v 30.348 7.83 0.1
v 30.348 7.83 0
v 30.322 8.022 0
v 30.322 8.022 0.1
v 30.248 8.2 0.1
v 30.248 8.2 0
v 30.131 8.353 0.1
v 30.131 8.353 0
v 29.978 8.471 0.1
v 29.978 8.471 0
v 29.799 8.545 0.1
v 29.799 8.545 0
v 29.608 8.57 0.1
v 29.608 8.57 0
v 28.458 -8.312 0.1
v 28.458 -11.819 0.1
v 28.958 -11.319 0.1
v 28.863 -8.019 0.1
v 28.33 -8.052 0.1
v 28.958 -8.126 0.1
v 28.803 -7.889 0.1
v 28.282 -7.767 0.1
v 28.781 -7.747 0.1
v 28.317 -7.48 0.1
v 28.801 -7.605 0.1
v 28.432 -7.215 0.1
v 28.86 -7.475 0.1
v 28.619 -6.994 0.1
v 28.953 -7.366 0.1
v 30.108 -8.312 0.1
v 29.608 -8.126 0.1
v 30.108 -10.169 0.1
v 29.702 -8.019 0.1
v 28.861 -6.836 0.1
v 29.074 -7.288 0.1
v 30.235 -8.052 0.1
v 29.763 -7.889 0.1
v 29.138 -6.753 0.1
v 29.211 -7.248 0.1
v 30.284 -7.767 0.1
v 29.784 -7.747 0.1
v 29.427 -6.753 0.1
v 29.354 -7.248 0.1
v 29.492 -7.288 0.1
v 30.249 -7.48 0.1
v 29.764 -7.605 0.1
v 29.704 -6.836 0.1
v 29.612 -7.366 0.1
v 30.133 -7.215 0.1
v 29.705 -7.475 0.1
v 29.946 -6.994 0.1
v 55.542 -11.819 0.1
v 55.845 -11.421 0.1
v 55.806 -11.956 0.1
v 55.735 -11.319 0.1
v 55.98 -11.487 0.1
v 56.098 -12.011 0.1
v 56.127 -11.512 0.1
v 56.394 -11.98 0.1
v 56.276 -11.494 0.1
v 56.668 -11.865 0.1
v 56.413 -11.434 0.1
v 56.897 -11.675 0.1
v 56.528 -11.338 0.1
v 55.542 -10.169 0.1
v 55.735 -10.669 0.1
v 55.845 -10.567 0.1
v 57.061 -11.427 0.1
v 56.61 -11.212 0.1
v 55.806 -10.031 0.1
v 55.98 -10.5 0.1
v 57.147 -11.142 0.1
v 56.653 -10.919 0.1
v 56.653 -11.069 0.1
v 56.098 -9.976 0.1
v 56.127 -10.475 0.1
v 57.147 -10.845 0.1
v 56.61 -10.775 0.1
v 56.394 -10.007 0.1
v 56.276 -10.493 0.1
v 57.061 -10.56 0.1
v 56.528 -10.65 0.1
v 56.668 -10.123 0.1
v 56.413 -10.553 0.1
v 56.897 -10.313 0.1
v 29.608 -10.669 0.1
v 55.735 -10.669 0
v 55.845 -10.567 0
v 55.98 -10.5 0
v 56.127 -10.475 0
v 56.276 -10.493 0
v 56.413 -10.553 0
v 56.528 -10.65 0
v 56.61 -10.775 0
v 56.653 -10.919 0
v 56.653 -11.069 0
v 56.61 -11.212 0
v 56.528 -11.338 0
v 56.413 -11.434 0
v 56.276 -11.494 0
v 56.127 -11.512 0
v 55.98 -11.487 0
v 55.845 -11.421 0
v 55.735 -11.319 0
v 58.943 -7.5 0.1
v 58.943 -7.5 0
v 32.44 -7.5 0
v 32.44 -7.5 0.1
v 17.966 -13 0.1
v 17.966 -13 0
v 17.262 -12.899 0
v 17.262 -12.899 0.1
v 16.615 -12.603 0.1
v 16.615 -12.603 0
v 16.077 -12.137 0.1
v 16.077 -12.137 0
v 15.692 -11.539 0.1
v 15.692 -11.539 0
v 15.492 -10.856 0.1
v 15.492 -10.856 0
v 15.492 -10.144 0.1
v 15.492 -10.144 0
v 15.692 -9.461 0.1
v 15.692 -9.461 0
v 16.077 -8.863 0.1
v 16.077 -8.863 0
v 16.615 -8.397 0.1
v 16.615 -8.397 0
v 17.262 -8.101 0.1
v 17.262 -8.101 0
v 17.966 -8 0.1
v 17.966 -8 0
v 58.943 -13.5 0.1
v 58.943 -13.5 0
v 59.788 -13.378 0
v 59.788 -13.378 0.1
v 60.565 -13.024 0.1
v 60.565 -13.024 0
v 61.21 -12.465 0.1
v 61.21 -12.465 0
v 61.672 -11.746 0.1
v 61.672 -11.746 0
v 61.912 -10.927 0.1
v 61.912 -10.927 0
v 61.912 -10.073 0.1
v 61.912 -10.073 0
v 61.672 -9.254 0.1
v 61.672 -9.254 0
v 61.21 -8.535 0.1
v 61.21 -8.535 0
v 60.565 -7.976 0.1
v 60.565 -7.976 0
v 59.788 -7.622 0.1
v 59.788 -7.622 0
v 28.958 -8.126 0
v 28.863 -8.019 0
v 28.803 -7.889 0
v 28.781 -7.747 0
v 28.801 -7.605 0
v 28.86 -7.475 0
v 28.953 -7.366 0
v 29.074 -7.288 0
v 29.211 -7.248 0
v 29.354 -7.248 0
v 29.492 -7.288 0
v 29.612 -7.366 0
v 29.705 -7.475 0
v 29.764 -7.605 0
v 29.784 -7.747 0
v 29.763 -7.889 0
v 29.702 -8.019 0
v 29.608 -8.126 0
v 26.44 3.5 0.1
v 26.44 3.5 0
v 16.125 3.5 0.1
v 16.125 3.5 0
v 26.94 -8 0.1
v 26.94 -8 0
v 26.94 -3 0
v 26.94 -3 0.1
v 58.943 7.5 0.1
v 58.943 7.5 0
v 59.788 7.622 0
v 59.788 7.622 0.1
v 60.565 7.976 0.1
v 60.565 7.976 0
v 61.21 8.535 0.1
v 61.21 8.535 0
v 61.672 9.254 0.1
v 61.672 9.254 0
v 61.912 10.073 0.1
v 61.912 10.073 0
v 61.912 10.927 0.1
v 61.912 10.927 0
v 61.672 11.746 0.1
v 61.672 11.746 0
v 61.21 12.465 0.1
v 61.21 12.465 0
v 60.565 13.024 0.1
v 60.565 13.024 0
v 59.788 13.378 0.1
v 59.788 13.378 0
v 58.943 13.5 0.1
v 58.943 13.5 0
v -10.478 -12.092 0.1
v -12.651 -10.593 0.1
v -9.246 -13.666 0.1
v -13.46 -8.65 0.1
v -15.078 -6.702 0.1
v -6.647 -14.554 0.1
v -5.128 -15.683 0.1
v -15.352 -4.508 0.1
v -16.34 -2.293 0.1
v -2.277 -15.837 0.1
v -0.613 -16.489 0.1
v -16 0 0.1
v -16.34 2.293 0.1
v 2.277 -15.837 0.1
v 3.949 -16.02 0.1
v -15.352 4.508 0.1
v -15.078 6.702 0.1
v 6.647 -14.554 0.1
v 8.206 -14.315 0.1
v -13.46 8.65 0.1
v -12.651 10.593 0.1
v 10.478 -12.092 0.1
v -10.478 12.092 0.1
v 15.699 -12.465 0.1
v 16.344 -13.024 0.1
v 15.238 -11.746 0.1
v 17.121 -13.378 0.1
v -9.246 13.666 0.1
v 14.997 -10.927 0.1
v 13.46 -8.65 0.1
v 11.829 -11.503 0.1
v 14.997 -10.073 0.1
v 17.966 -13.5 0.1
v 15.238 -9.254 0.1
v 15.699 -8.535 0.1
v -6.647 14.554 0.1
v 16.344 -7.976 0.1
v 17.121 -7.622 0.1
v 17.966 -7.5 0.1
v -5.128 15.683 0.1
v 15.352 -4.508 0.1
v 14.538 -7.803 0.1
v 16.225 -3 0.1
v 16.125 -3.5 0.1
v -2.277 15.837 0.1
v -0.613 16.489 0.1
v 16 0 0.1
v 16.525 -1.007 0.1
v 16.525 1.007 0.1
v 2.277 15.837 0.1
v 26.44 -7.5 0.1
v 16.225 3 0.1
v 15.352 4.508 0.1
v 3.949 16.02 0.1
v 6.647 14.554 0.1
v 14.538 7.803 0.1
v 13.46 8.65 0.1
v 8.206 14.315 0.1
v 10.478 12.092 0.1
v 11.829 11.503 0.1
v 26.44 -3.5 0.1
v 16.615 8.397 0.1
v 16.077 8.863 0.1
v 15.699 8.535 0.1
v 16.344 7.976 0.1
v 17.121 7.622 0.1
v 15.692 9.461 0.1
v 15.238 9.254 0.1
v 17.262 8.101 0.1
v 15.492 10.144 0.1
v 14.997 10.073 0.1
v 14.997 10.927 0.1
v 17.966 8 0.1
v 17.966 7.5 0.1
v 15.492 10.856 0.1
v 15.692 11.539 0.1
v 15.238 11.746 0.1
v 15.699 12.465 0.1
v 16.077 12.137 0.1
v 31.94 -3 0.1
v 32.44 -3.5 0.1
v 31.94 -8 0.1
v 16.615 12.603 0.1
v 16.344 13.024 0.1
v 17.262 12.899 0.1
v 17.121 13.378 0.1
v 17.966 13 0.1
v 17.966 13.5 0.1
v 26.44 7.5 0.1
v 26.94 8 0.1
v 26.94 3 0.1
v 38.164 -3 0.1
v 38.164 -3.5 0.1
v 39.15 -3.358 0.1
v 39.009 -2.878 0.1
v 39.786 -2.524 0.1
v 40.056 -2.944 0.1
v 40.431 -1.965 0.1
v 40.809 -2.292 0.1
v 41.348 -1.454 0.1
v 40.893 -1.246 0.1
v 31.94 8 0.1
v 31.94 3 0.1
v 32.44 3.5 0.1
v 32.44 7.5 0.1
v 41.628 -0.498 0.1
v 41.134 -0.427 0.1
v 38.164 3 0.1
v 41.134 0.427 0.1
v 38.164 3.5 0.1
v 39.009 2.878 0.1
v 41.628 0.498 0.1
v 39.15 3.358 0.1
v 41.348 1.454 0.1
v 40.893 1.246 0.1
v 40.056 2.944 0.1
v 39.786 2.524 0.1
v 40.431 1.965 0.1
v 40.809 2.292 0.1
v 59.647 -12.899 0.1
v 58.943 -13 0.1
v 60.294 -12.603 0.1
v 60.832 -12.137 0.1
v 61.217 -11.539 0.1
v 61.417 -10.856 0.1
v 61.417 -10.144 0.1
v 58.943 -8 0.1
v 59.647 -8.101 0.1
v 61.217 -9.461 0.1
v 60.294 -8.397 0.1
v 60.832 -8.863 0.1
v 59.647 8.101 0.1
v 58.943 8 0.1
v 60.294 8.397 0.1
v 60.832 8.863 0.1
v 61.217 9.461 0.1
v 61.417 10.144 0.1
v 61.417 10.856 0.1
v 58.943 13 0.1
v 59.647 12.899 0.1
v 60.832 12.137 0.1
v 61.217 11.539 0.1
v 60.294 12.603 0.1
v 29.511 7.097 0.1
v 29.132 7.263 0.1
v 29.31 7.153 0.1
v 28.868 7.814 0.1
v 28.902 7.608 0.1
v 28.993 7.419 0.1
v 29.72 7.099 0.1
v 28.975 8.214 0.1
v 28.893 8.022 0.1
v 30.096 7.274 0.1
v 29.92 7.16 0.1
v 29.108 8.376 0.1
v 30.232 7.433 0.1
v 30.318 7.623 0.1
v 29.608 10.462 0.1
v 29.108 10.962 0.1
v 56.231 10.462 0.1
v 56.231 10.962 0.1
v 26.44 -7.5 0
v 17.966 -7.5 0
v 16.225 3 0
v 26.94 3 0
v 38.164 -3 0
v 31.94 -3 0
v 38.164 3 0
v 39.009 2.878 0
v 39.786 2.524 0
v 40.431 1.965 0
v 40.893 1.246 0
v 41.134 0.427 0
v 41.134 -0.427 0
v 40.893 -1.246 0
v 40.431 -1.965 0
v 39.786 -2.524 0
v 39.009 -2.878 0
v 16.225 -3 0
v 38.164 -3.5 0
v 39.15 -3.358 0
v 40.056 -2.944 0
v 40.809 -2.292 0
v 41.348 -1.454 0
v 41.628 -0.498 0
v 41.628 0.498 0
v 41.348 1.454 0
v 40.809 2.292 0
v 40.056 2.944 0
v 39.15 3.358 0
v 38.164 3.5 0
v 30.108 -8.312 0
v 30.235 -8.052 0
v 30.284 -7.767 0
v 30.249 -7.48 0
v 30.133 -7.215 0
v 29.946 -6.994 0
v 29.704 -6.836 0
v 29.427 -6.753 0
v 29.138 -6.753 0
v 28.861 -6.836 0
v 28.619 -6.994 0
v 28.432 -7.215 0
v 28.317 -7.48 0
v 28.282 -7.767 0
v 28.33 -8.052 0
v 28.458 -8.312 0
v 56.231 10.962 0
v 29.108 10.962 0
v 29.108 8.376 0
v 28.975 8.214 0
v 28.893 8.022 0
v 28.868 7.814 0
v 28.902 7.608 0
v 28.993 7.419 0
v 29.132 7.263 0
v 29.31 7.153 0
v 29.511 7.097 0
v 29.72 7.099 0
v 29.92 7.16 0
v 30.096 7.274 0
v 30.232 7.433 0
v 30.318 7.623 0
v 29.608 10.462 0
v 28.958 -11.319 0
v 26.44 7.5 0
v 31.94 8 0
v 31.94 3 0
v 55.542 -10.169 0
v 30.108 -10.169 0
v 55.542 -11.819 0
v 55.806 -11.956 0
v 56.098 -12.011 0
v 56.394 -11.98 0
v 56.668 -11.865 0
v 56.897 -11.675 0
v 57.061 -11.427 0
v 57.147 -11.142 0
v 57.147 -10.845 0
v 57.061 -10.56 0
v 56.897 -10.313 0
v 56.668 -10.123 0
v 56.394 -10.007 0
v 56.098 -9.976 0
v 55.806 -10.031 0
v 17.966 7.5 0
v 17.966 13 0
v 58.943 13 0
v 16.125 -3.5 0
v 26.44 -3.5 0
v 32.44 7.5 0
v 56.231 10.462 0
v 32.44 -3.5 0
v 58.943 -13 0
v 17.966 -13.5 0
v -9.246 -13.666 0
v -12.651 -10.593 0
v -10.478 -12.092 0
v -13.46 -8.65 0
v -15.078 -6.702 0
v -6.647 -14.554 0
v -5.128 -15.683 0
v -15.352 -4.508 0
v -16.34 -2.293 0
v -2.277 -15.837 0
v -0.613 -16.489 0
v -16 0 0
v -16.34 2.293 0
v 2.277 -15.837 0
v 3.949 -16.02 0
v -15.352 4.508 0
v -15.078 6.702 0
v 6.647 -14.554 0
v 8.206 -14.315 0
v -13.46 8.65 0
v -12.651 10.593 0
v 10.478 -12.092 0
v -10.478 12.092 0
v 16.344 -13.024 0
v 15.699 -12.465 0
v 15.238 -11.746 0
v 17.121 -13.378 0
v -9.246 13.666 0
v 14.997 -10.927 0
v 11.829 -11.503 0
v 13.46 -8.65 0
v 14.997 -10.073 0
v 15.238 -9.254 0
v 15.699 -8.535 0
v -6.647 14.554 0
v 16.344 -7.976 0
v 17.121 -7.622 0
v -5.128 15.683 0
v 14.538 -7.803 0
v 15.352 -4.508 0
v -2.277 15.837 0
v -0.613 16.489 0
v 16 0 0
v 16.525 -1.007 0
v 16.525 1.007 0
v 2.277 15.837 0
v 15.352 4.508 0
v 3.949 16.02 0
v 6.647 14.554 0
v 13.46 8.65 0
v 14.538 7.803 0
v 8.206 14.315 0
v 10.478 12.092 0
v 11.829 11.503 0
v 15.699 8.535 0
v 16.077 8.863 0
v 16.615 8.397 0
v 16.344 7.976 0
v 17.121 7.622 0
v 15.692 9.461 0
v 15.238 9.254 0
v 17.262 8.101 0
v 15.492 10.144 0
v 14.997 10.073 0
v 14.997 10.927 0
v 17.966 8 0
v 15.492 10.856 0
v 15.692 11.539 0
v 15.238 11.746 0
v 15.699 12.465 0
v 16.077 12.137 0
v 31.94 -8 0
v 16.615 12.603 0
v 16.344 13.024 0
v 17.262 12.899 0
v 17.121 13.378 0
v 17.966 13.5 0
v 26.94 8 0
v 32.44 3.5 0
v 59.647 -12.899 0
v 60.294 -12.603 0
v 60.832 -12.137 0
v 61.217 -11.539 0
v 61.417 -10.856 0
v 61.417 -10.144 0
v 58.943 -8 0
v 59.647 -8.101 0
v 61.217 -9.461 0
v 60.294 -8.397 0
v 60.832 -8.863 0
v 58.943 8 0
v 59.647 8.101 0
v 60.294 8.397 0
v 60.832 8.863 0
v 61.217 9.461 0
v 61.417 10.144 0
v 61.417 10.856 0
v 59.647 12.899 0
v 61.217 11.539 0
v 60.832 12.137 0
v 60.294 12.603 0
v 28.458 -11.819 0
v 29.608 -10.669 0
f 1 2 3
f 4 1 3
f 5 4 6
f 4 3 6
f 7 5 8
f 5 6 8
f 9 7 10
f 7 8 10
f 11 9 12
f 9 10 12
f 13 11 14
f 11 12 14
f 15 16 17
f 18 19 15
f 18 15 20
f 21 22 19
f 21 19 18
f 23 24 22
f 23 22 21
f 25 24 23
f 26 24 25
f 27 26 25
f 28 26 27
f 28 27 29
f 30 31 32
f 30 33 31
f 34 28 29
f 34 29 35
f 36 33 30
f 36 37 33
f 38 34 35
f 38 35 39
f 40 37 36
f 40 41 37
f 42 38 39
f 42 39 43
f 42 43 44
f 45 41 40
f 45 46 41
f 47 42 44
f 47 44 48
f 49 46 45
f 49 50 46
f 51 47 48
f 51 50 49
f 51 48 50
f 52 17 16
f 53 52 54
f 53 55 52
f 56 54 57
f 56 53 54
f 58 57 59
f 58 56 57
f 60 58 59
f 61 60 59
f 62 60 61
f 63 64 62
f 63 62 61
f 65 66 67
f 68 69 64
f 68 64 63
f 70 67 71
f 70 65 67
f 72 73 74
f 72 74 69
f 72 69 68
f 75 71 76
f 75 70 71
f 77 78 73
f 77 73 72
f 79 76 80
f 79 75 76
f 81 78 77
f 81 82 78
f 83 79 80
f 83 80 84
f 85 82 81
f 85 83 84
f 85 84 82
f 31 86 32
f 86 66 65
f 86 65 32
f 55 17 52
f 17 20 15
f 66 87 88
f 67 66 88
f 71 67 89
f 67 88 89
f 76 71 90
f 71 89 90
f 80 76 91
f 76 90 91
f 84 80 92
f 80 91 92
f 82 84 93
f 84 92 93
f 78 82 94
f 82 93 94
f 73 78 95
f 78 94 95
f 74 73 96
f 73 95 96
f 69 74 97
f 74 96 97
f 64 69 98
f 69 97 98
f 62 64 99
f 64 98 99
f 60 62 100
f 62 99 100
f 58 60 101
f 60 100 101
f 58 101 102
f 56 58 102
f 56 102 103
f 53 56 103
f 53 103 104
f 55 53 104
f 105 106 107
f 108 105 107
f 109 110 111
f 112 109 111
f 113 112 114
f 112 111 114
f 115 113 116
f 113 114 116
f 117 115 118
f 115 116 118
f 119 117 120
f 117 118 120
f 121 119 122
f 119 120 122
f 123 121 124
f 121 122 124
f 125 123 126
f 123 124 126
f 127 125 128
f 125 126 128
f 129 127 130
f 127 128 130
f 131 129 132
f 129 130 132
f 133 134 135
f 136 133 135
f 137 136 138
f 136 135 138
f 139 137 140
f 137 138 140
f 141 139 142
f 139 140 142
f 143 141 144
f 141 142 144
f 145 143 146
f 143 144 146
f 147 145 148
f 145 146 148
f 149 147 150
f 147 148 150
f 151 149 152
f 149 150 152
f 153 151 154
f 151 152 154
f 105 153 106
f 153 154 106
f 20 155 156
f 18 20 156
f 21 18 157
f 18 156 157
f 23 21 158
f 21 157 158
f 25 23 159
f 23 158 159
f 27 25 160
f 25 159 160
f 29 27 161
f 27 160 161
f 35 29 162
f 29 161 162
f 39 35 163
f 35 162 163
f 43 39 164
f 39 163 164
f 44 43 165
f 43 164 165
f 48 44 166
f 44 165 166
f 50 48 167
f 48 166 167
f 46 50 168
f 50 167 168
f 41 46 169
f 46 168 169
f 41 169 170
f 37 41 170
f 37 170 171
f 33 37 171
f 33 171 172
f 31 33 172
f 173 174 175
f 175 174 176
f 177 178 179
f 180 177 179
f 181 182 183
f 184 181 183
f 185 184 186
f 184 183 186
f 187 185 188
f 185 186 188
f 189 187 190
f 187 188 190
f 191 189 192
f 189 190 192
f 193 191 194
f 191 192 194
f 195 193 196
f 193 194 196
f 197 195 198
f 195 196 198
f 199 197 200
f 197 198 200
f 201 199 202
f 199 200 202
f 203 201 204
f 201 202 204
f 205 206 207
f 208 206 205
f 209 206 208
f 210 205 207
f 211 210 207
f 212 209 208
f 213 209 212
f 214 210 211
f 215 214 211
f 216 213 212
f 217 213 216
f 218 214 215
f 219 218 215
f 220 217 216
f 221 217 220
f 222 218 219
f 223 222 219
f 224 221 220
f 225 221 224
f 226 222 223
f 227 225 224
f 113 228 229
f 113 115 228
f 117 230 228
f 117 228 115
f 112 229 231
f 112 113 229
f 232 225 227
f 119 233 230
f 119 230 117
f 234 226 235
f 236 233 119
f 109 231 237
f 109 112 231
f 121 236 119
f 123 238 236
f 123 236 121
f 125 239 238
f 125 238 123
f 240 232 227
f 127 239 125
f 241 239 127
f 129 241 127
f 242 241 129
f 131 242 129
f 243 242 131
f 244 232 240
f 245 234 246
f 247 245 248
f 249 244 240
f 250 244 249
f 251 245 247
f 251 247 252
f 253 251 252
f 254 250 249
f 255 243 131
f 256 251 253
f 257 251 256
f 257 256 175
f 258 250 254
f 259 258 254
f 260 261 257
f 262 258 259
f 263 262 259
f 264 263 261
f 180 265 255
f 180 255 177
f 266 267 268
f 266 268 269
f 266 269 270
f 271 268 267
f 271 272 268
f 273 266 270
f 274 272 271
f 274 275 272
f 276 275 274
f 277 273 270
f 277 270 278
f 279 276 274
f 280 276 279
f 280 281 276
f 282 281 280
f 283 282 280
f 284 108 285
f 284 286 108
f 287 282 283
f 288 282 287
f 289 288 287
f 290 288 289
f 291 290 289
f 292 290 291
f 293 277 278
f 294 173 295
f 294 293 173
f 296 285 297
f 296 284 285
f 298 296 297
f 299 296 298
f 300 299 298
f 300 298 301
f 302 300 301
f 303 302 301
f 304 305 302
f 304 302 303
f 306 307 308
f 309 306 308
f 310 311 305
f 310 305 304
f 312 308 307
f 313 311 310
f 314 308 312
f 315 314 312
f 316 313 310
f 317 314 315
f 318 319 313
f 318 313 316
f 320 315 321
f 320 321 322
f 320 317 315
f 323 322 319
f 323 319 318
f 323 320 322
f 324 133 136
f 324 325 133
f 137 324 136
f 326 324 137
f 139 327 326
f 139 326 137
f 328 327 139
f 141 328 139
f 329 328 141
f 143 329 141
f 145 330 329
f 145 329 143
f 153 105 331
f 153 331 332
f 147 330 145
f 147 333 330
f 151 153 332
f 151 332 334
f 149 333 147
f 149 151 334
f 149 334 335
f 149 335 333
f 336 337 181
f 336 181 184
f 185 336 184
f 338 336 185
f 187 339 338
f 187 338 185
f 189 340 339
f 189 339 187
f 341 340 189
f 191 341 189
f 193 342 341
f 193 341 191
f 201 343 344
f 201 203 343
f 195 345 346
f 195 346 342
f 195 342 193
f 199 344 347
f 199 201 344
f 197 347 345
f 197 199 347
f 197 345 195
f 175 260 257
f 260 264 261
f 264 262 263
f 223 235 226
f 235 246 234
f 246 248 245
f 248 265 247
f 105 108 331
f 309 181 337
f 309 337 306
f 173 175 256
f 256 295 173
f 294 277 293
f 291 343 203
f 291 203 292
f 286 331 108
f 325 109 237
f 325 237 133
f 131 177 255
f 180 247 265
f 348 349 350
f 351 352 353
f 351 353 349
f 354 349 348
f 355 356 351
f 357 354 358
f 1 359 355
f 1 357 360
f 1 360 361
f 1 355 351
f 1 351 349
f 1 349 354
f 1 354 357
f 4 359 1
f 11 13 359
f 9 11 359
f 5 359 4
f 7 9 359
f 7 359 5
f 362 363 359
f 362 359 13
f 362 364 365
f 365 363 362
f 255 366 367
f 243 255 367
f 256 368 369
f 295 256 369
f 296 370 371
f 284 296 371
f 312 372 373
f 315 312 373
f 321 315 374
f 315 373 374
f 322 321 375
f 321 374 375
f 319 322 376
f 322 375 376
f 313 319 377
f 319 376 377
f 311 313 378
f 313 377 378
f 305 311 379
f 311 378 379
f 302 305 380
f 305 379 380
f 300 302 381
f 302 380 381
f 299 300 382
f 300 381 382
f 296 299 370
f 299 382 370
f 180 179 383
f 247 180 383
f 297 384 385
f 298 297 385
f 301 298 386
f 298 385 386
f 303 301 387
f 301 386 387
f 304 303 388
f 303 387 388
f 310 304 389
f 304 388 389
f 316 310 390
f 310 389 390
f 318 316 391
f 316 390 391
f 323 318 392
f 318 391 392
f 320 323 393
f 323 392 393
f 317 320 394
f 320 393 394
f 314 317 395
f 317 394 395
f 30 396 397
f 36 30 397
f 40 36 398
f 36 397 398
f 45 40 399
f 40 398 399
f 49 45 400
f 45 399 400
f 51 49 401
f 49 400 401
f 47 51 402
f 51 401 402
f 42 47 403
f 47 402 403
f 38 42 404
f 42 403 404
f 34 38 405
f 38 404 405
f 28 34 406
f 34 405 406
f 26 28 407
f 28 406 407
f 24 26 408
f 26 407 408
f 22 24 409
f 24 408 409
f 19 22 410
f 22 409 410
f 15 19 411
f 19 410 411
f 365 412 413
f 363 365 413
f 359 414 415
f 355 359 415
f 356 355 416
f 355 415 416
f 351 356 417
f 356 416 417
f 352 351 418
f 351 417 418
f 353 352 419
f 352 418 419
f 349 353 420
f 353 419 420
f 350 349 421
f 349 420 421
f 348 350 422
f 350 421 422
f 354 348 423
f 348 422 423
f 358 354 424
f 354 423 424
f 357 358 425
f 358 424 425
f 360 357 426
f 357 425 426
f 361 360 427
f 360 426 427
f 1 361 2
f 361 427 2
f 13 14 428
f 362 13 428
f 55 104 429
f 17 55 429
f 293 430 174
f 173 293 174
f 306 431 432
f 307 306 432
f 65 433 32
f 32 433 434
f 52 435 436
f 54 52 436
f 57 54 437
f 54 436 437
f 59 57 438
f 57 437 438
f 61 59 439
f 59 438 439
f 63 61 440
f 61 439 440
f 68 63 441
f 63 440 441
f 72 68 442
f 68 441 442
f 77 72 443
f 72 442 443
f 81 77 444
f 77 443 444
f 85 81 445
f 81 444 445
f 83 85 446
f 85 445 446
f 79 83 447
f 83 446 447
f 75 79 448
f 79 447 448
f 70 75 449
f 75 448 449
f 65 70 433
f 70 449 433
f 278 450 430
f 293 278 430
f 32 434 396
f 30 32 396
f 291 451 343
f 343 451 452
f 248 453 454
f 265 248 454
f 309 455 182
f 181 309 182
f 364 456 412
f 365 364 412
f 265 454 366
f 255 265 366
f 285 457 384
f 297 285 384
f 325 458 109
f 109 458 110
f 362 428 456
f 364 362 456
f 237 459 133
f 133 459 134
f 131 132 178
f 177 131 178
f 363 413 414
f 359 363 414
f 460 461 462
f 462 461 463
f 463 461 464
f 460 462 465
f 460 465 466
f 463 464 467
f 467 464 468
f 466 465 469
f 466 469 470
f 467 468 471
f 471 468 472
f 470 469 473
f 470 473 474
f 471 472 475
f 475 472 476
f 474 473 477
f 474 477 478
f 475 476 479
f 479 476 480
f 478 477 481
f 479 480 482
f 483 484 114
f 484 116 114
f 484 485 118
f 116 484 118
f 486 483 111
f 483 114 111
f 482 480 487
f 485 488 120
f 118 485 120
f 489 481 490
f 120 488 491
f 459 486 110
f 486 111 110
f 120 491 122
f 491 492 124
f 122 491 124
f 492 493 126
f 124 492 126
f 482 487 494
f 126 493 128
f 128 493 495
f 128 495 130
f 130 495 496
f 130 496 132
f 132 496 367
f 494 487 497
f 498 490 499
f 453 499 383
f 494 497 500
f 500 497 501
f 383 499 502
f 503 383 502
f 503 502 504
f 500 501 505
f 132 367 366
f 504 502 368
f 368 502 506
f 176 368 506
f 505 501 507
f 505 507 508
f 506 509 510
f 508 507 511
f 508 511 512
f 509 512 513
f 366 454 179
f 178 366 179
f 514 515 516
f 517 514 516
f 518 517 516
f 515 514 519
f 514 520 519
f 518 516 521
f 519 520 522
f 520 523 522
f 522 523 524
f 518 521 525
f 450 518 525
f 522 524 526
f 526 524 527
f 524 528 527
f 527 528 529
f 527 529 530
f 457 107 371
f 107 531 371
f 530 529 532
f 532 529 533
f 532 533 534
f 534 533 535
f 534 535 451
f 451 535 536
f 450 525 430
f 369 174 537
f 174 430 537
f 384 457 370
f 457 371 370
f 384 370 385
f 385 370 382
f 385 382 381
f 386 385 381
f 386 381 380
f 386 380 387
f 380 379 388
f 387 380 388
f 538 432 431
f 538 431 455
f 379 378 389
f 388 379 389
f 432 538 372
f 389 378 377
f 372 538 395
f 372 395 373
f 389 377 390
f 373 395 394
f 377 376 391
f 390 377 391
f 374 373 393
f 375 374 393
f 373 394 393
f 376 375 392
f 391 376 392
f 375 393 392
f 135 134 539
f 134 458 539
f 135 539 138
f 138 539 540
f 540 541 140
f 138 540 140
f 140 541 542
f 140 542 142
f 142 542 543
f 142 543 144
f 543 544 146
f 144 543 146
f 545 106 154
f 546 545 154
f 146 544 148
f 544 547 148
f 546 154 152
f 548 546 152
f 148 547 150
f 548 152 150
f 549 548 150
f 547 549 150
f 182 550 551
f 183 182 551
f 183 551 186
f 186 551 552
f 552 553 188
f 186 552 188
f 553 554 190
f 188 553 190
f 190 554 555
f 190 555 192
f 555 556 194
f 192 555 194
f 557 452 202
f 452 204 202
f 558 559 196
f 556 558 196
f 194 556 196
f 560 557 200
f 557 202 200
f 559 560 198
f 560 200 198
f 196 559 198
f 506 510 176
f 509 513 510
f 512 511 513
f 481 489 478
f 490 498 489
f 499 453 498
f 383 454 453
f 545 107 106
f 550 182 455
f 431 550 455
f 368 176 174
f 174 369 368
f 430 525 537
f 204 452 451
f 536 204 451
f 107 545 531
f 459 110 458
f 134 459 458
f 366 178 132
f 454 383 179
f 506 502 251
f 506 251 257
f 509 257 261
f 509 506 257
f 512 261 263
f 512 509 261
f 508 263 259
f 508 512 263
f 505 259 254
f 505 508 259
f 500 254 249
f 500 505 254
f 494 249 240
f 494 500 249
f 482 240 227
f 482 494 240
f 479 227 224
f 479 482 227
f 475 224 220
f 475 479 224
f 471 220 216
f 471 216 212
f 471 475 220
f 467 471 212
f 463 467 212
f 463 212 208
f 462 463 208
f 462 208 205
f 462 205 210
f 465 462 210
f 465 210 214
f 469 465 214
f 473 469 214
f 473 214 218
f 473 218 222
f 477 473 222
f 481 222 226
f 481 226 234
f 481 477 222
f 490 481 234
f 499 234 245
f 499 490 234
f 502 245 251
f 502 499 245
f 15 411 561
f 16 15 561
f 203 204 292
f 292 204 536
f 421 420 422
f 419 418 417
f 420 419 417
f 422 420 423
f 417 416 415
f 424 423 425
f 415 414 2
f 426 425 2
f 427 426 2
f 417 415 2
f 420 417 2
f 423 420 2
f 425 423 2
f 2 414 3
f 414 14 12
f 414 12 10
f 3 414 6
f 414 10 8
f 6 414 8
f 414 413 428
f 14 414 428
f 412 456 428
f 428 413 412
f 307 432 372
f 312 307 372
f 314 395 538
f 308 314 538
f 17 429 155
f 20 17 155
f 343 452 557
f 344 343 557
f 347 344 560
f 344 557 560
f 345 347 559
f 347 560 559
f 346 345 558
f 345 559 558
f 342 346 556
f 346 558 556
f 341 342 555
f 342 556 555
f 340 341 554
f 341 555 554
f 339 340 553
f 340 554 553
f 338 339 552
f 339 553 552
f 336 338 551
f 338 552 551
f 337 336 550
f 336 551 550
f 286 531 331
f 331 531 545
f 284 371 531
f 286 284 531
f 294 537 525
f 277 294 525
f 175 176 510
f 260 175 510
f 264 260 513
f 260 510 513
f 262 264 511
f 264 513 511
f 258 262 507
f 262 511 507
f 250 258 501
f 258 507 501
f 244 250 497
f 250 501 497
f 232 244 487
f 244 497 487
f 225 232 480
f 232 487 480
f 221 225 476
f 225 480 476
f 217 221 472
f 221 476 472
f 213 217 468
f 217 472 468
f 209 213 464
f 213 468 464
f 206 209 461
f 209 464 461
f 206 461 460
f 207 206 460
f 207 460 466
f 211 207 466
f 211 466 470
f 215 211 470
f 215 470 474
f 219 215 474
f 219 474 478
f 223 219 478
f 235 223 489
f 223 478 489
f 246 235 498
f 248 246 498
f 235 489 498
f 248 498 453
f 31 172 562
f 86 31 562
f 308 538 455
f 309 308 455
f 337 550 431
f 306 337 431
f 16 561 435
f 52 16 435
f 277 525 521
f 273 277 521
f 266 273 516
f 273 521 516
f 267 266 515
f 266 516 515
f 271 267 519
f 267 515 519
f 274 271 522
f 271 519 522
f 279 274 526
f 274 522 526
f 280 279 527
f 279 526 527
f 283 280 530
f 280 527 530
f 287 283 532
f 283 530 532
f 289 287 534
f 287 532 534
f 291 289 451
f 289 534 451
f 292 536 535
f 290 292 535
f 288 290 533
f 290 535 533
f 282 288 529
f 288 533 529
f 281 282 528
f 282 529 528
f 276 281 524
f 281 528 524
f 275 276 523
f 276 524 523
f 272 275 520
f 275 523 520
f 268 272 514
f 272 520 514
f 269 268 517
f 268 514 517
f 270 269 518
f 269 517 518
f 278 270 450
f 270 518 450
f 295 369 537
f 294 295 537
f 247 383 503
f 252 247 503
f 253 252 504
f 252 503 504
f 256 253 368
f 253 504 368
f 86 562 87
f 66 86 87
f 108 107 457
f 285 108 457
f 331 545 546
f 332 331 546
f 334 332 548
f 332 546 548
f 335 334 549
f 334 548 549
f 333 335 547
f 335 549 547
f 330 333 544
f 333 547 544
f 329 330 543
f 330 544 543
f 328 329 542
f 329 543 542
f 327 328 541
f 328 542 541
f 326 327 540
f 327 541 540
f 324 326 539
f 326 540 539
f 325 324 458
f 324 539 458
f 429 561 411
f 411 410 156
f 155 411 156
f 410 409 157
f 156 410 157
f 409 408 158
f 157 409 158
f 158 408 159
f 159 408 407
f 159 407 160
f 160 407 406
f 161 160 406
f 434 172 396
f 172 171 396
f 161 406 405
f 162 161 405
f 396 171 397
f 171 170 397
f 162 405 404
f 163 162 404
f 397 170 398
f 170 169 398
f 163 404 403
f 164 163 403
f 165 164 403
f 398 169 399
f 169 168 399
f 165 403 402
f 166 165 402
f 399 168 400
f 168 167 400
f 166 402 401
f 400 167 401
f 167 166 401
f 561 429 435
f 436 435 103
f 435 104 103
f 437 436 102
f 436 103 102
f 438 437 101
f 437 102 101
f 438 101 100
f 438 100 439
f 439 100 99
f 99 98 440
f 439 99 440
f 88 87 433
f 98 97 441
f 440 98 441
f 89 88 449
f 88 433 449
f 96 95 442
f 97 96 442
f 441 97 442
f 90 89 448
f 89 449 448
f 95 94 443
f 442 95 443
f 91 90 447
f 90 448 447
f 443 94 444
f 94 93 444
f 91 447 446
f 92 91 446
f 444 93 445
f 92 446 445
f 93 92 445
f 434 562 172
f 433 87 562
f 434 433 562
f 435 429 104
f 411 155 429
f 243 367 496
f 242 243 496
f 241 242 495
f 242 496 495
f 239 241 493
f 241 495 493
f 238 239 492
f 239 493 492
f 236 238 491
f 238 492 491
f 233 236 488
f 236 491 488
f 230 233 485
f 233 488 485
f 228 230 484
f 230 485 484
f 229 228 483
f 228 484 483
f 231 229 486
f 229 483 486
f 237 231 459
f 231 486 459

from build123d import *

# Parameters (mm, degrees)
F0_R     = 16
F1_DEPTH = 0.1
F3_DEPTH = 0.1


with BuildPart() as f1:
    # F0 (on Top) → F1 (new body)
    with BuildSketch(Plane.XY):
        with BuildLine():
            ThreePointArc((16.224981, -3), (16.562818, 0), (16.224981, 3))
            ThreePointArc((16.224981, 3), (16.17668, 3.250388), (16.124515, 3.5))
            ThreePointArc((16.124515, 3.5), (-16.5, 0), (16.124515, -3.5))
            ThreePointArc((16.124515, -3.5), (16.17668, -3.250388), (16.224981, -3))
        make_face()
        Circle(F0_R, mode=Mode.SUBTRACT)
        with BuildLine():
            ThreePointArc((16.124515, 3.5), (16.17668, 3.250388), (16.224981, 3))
            Line((16.224981, 3), (26.94017, 3))
            Line((26.94017, 3), (26.94017, 8))
            Line((26.94017, 8), (17.966412, 8))
            ThreePointArc((17.966412, 8), (15.466412, 10.5), (17.966412, 13))
            Line((17.966412, 13), (58.942758, 13))
            ThreePointArc((58.942758, 13), (61.442758, 10.5), (58.942758, 8))
            Line((58.942758, 8), (31.94017, 8))
            Line((31.94017, 8), (31.94017, 3))
            Line((31.94017, 3), (38.164107, 3))
            ThreePointArc((38.164107, 3), (41.164107, 0), (38.164107, -3))
            Line((38.164107, -3), (31.94017, -3))
            Line((31.94017, -3), (31.94017, -8))
            Line((31.94017, -8), (58.942758, -8))
            ThreePointArc((58.942758, -8), (61.442758, -10.5), (58.942758, -13))
            Line((58.942758, -13), (17.966412, -13))
            ThreePointArc((17.966412, -13), (15.466412, -10.5), (17.966412, -8))
            Line((17.966412, -8), (26.94017, -8))
            Line((26.94017, -8), (26.94017, -3))
            Line((26.94017, -3), (16.224981, -3))
            ThreePointArc((16.224981, -3), (16.17668, -3.250388), (16.124515, -3.5))
            Line((16.124515, -3.5), (26.44017, -3.5))
            Line((26.44017, -3.5), (26.44017, -7.5))
            Line((26.44017, -7.5), (17.966412, -7.5))
            ThreePointArc((17.966412, -7.5), (14.966412, -10.5), (17.966412, -13.5))
            Line((17.966412, -13.5), (58.942758, -13.5))
            ThreePointArc((58.942758, -13.5), (61.942758, -10.5), (58.942758, -7.5))
            Line((58.942758, -7.5), (32.44017, -7.5))
            Line((32.44017, -7.5), (32.44017, -3.5))
            Line((32.44017, -3.5), (38.164107, -3.5))
            ThreePointArc((38.164107, -3.5), (41.664107, 0), (38.164107, 3.5))
            Line((38.164107, 3.5), (32.44017, 3.5))
            Line((32.44017, 3.5), (32.44017, 7.5))
            Line((32.44017, 7.5), (58.942758, 7.5))
            ThreePointArc((58.942758, 7.5), (61.942758, 10.5), (58.942758, 13.5))
            Line((58.942758, 13.5), (17.966412, 13.5))
            ThreePointArc((17.966412, 13.5), (14.966412, 10.5), (17.966412, 7.5))
            Line((17.966412, 7.5), (26.44017, 7.5))
            Line((26.44017, 7.5), (26.44017, 3.5))
            Line((26.44017, 3.5), (16.124515, 3.5))
        make_face()
    extrude(amount=F1_DEPTH)


with BuildPart() as f3:
    # F2 (on Top) → F3 (new body)
    with BuildSketch(Plane.XY):
        with BuildLine():
            Line((29.607697, 10.461607), (56.231415, 10.461607))
            Line((56.231415, 10.461607), (56.231415, 10.961607))
            Line((56.231415, 10.961607), (29.107697, 10.961607))
            Line((29.107697, 10.961607), (29.107697, 8.375616))
            ThreePointArc((29.107697, 8.375616), (29.339443, 8.519799), (29.607697, 8.570144))
            Line((29.607697, 8.570144), (29.607697, 10.461607))
        make_face()
        with BuildLine():
            ThreePointArc((30.347543, 7.830298), (30.130847, 8.353448), (29.607697, 8.570144))
            Line((29.607697, 8.570144), (29.607697, 7.830298))
            Line((29.607697, 7.830298), (29.107697, 7.830298))
            Line((29.107697, 7.830298), (29.107697, 8.375616))
            ThreePointArc((29.107697, 8.375616), (29.309831, 7.153062), (30.347543, 7.830298))
        make_face()
        with BuildLine():
            Line((29.607697, 7.830298), (29.607697, 8.570144))
            ThreePointArc((29.607697, 8.570144), (29.339443, 8.519799), (29.107697, 8.375616))
            Line((29.107697, 8.375616), (29.107697, 7.830298))
            Line((29.107697, 7.830298), (29.607697, 7.830298))
        make_face()
        with BuildLine():
            Line((28.457697, -11.818727), (55.542194, -11.818727))
            ThreePointArc((55.542194, -11.818727), (57.158196, -10.993727), (55.542194, -10.168727))
            Line((55.542194, -10.168727), (30.107697, -10.168727))
            Line((30.107697, -10.168727), (30.107697, -8.311753))
            ThreePointArc((30.107697, -8.311753), (29.282697, -6.742833), (28.457697, -8.311753))
            Line((28.457697, -8.311753), (28.457697, -11.818727))
        make_face()
        with BuildLine():
            Line((29.607697, -10.668727), (55.735489, -10.668727))
            ThreePointArc((55.735489, -10.668727), (56.658196, -10.993727), (55.735489, -11.318727))
            Line((55.735489, -11.318727), (28.957697, -11.318727))
            Line((28.957697, -11.318727), (28.957697, -8.125968))
            ThreePointArc((28.957697, -8.125968), (29.282697, -7.242833), (29.607697, -8.125968))
            Line((29.607697, -8.125968), (29.607697, -10.668727))
        make_face(mode=Mode.SUBTRACT)
    extrude(amount=F3_DEPTH)


solid = Compound([f1.part, f3.part])
